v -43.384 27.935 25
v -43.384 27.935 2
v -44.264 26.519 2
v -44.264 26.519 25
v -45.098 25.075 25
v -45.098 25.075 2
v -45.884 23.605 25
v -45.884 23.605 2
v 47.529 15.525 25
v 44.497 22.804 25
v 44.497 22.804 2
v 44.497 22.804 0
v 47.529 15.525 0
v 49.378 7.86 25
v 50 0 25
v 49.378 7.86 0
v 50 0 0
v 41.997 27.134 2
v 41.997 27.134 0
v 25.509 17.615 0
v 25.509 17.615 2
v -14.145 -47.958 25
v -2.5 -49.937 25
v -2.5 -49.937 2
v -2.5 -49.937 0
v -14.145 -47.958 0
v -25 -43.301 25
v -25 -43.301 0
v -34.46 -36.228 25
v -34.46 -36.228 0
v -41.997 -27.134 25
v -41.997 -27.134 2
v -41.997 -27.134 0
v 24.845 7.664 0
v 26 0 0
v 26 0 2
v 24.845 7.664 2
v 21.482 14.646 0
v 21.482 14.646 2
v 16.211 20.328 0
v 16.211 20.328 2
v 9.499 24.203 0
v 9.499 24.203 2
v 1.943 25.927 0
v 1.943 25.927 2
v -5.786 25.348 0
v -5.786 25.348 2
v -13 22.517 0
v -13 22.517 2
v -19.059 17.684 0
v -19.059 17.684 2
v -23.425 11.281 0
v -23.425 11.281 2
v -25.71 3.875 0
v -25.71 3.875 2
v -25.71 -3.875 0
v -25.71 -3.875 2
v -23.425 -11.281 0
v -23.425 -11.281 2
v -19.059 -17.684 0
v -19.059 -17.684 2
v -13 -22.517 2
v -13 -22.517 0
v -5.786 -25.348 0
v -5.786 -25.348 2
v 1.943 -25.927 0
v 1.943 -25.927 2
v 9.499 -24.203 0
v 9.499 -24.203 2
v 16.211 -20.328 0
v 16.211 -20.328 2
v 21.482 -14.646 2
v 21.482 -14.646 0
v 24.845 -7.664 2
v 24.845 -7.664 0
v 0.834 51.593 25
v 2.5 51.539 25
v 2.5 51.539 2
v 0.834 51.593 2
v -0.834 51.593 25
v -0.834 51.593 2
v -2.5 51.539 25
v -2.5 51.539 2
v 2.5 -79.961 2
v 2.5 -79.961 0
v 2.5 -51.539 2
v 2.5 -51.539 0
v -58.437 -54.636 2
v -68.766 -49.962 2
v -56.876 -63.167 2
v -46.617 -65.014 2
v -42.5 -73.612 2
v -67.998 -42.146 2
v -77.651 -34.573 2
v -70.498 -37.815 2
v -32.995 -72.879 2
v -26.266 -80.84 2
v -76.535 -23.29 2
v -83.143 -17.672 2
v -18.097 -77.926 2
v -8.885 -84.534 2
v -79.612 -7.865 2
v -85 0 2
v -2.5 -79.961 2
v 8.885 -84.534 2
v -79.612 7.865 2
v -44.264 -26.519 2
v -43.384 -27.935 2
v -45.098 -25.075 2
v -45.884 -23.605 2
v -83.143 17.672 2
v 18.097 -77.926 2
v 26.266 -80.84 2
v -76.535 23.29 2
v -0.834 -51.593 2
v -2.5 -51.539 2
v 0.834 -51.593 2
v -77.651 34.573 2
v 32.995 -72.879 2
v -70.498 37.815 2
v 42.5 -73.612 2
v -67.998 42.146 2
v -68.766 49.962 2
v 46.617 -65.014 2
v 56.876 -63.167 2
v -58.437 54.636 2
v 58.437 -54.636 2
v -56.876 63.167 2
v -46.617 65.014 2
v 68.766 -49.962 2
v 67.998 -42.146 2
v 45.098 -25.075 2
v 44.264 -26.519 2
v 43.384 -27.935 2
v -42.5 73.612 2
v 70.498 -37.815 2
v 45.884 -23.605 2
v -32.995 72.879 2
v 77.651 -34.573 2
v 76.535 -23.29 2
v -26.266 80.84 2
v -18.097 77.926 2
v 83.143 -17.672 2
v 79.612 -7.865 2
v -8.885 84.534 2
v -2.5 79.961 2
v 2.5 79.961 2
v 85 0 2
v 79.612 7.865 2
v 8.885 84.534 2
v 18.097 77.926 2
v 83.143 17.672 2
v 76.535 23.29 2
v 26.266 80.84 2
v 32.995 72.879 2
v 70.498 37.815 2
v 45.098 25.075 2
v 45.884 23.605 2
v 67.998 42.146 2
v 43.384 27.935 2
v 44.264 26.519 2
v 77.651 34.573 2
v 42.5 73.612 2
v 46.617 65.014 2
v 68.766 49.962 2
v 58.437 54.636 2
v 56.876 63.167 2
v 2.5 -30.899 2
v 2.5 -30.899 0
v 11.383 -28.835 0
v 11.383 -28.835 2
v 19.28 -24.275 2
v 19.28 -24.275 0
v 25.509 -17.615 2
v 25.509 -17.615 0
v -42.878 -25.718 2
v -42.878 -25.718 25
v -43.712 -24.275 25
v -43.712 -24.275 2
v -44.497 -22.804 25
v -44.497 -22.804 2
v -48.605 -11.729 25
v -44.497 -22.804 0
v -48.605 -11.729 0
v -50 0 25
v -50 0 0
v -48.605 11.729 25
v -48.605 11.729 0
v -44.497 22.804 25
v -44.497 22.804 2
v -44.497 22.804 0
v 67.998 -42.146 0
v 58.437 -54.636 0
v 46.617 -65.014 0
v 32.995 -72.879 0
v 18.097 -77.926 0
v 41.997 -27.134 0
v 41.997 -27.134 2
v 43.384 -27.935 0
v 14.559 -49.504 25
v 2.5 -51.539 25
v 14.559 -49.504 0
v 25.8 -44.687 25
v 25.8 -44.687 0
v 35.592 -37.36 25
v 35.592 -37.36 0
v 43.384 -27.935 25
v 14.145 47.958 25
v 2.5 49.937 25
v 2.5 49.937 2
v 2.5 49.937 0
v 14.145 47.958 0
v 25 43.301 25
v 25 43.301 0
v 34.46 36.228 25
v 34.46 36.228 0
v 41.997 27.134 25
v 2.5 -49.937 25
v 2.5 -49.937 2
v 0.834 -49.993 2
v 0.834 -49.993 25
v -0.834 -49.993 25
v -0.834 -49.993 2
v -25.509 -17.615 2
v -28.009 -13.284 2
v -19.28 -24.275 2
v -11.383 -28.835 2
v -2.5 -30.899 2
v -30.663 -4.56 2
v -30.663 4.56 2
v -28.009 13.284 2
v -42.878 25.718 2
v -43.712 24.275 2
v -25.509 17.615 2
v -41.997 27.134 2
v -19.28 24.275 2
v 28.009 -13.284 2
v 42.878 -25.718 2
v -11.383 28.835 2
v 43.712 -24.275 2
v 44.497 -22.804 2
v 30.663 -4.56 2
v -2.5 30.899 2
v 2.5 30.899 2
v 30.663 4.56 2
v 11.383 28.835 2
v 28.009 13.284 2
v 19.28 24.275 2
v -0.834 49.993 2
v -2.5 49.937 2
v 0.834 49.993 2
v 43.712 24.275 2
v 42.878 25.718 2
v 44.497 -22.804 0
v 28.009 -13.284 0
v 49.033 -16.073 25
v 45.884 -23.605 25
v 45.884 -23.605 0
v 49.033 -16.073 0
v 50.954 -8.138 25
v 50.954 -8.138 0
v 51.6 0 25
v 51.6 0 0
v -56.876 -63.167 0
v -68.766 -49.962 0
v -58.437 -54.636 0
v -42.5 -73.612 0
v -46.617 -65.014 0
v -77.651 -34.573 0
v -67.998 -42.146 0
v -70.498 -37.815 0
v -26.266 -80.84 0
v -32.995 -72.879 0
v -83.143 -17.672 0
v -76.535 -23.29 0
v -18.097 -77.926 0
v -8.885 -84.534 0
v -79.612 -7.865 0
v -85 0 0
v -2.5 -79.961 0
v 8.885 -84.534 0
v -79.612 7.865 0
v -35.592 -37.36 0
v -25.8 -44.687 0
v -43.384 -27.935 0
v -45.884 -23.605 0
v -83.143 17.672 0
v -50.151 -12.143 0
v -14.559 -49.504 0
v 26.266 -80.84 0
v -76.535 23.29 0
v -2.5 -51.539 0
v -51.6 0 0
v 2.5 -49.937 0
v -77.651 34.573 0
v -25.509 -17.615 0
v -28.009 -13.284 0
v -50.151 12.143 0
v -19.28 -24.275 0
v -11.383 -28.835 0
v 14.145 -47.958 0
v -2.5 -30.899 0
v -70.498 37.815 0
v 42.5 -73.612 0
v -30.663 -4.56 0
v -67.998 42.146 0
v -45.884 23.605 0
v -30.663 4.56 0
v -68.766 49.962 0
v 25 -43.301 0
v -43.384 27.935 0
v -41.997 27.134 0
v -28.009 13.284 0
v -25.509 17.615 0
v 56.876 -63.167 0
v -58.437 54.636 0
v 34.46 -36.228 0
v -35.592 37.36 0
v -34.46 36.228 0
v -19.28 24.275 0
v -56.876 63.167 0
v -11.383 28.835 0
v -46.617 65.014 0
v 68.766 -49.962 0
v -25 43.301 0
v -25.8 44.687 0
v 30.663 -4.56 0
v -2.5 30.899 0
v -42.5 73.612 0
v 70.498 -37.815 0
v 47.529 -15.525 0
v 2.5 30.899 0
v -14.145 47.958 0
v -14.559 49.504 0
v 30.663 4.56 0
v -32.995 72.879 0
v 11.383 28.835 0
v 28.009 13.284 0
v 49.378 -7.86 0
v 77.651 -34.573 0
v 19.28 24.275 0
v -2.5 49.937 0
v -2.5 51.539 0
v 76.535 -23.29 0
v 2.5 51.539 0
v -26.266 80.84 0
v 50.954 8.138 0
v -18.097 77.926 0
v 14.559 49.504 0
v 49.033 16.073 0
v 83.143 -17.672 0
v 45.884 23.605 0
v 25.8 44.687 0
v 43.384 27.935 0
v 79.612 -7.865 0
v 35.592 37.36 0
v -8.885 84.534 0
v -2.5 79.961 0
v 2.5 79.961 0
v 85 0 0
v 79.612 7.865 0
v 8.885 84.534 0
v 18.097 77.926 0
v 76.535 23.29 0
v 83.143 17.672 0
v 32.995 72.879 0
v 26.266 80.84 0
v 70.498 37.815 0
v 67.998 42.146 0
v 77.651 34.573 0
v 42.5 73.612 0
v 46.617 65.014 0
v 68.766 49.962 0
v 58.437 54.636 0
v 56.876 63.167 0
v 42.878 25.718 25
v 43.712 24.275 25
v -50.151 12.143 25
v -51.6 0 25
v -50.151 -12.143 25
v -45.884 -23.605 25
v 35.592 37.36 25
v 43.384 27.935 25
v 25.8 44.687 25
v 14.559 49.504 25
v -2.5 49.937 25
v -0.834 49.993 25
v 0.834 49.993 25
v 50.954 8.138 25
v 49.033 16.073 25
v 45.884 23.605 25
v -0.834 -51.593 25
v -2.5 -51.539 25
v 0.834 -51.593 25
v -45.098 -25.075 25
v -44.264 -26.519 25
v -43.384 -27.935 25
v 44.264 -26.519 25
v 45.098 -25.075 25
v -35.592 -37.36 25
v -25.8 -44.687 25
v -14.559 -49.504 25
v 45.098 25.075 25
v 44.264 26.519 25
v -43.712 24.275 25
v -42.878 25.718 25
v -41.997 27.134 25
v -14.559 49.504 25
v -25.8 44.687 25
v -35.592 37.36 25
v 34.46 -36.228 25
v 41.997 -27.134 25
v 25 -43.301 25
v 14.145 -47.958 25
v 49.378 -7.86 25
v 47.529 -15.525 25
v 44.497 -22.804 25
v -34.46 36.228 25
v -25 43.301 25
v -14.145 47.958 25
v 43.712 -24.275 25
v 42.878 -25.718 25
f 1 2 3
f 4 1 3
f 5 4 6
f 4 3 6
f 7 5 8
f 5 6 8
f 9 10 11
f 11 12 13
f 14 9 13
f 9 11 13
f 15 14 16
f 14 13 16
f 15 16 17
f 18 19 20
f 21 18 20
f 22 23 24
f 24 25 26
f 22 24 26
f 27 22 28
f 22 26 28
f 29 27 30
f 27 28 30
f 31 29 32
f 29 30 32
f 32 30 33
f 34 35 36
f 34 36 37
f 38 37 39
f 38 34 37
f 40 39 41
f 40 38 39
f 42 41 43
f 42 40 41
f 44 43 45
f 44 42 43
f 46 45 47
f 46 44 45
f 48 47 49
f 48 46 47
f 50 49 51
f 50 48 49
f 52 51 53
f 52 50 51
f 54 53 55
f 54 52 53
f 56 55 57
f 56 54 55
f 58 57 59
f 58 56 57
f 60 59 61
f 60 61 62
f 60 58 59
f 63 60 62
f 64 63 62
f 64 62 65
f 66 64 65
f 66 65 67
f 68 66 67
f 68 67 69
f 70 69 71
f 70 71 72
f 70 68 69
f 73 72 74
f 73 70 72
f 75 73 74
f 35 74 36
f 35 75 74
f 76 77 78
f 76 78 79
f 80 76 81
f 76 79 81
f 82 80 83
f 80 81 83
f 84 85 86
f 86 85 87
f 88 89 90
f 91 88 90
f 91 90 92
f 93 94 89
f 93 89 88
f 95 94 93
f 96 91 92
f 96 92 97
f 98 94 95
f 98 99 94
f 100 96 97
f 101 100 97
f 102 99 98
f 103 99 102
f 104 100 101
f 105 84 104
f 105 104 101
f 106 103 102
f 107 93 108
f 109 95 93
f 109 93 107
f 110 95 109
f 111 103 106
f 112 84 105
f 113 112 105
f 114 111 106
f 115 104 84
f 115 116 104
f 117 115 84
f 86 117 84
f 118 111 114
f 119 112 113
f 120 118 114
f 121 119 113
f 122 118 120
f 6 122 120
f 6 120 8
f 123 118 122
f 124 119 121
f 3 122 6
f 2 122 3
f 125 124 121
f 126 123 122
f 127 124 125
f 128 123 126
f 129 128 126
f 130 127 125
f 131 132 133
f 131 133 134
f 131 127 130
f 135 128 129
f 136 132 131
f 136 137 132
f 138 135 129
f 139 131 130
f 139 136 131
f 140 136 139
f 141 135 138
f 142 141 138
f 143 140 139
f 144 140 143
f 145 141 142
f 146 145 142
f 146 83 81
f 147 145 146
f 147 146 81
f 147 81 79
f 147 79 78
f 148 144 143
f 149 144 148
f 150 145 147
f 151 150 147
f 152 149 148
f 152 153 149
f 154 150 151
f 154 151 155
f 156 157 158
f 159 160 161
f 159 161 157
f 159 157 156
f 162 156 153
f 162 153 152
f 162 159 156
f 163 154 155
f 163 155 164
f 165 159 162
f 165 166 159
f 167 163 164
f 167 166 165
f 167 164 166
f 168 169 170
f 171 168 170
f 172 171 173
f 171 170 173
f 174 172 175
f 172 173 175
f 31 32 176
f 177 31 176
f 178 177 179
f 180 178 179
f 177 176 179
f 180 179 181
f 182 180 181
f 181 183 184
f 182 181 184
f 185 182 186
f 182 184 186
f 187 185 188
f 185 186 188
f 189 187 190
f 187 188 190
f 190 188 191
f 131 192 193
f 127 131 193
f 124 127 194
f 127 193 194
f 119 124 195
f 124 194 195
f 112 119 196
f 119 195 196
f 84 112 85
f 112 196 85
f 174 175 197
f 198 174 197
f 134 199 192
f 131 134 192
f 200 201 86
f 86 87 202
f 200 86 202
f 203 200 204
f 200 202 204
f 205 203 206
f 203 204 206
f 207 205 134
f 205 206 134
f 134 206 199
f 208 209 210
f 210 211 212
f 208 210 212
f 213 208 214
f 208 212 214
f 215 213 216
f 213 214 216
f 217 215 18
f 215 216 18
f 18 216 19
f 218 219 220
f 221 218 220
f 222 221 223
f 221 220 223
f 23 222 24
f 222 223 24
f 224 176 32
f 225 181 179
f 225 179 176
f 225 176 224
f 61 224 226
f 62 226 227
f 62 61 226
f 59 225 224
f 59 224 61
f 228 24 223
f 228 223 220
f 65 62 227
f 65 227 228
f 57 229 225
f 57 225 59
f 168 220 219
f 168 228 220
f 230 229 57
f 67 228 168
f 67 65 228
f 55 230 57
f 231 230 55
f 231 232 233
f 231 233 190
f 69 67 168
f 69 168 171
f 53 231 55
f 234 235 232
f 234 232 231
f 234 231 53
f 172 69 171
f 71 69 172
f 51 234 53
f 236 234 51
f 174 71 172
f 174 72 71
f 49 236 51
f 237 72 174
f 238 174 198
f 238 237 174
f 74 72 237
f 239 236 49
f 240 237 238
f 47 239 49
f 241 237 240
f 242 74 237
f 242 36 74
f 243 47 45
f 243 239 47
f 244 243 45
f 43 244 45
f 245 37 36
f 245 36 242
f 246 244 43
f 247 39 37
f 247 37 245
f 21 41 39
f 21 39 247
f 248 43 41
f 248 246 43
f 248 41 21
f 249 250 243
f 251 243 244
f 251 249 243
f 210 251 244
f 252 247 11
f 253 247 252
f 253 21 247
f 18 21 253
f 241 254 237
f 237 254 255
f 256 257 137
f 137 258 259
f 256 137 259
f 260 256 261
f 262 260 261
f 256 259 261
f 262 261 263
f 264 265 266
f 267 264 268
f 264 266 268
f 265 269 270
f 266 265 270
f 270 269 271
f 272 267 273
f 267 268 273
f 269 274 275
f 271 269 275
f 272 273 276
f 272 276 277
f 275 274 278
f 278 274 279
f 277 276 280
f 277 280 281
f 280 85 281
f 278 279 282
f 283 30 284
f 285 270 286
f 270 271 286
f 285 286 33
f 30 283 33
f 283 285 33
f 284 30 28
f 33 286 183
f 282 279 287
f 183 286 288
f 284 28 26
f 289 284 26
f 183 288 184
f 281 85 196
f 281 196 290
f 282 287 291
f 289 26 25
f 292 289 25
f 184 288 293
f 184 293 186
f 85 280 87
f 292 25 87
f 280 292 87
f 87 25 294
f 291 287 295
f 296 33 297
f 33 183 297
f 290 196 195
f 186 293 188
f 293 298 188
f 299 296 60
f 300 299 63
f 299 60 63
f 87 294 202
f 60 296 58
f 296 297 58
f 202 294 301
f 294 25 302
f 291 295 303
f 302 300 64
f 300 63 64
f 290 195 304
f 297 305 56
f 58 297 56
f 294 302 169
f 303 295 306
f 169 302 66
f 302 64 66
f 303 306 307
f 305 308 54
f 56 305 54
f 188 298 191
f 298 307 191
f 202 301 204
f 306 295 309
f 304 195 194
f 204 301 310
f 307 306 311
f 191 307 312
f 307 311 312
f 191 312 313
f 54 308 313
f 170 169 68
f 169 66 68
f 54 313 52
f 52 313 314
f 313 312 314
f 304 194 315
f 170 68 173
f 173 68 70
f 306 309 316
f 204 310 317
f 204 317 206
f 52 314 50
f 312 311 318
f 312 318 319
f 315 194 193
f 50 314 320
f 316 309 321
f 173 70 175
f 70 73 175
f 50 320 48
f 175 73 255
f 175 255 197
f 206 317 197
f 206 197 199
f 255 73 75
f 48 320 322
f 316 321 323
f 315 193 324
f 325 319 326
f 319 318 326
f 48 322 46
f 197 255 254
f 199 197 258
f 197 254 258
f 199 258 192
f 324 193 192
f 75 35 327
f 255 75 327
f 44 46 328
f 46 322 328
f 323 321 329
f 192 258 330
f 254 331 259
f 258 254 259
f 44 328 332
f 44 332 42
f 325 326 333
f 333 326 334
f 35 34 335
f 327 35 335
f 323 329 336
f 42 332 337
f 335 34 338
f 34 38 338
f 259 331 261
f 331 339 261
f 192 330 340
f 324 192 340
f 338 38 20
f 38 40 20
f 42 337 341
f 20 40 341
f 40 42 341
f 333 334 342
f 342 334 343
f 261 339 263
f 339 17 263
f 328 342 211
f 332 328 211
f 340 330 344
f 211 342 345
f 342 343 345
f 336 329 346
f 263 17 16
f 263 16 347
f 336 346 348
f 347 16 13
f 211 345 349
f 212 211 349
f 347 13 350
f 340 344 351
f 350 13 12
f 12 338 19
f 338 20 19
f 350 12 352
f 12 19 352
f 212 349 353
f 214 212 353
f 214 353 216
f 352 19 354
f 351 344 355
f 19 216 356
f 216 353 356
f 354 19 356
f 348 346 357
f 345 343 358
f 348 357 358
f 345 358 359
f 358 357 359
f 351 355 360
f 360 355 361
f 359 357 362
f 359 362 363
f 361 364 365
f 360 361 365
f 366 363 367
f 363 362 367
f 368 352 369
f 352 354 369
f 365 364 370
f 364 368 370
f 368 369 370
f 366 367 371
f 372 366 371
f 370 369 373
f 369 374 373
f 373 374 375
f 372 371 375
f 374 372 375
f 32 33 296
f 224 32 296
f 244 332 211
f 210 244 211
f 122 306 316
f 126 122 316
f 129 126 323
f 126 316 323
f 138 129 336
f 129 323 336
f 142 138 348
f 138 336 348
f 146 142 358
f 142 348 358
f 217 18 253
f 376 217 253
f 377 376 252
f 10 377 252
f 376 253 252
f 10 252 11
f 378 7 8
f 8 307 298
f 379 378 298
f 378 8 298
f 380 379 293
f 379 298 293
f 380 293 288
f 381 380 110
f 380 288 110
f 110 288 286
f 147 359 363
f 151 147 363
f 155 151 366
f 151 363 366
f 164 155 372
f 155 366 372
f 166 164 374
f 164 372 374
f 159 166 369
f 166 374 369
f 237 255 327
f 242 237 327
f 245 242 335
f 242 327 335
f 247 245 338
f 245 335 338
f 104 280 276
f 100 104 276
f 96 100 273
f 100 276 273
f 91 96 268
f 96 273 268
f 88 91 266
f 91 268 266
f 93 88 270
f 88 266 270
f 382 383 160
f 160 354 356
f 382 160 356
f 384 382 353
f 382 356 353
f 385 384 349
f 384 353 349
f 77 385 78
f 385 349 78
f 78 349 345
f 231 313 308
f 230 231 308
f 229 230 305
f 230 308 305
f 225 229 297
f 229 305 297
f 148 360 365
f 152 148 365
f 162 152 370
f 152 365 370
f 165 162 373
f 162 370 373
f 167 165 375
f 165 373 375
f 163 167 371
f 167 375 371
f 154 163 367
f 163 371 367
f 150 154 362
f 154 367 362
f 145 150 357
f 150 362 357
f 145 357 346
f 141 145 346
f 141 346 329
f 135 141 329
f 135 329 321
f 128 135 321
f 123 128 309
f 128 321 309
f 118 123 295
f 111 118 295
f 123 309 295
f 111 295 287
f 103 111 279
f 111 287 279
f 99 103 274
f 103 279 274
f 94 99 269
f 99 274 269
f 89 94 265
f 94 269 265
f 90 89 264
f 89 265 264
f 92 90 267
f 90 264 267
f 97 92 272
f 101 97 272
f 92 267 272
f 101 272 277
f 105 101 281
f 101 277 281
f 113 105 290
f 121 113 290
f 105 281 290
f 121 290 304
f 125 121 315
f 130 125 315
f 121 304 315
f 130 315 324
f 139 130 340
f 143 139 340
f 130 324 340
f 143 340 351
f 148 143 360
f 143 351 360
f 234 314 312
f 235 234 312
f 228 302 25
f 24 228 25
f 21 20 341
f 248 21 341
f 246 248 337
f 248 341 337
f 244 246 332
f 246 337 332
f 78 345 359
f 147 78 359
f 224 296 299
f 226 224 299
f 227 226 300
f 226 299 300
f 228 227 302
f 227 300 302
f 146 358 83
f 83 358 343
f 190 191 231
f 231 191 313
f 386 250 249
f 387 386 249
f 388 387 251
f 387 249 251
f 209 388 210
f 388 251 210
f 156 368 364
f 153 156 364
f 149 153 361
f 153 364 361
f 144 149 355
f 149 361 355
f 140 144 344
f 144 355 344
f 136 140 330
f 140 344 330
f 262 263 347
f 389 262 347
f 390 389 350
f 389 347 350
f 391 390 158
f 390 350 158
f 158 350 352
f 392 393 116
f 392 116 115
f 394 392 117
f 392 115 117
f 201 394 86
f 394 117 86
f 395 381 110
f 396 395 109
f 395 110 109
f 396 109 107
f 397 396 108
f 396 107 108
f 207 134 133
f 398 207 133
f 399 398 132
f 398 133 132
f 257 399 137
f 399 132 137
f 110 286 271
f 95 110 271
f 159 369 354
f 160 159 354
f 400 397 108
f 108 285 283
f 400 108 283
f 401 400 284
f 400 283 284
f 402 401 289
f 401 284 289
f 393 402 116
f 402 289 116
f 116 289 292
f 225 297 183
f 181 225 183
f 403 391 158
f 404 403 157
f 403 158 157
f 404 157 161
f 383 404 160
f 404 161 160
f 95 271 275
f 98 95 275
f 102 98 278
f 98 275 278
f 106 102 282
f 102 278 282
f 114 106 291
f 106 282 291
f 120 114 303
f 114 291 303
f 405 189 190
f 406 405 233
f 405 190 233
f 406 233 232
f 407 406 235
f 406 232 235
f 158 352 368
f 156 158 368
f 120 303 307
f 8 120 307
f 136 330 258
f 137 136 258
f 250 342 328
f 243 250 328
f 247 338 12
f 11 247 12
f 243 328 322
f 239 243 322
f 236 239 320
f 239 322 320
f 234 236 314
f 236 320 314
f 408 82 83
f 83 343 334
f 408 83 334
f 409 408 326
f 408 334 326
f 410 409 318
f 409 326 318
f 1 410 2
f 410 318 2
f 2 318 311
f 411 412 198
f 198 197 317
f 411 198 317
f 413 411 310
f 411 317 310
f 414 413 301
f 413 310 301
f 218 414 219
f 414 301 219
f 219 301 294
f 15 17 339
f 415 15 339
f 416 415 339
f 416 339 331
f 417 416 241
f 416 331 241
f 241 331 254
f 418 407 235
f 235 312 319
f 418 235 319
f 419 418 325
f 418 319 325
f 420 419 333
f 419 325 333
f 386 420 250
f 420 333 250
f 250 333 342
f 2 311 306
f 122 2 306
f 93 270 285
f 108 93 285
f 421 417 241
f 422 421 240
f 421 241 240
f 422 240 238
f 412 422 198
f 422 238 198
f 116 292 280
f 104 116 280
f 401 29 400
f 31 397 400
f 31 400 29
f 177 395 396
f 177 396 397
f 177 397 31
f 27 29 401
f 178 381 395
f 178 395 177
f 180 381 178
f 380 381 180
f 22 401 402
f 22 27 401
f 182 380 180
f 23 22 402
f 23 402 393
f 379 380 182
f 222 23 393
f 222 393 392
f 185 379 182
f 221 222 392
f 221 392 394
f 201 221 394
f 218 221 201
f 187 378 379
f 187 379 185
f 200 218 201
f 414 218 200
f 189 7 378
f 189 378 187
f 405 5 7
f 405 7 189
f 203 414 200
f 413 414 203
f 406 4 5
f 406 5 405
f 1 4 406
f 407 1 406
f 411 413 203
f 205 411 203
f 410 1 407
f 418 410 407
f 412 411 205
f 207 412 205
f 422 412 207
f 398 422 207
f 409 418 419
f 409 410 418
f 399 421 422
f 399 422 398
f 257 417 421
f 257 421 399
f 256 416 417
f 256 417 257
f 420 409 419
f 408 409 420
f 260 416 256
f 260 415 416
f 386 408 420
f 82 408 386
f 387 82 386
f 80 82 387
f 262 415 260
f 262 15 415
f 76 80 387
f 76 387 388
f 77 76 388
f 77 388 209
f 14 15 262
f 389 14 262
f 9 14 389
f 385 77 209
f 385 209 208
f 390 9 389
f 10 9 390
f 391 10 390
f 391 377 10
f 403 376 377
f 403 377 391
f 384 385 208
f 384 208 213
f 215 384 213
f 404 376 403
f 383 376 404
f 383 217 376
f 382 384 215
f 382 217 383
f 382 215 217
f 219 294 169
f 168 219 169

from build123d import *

# Parameters (mm, degrees)
F0_R     = 85
F0_R_2   = 26
F1_DEPTH = 2
F2_DEPTH = 25


with BuildPart() as f1:
    # F0 (on Top) → F1 (new body)
    with BuildSketch(Plane.XY):
        Circle(F0_R)
        with BuildLine():
            ThreePointArc((43.384432, 27.934765), (44.686911, 25.8), (45.884432, 23.604638))
            Line((45.884432, 23.604638), (70.498195, 37.8154))
            ThreePointArc((70.498195, 37.8154), (80, 0), (70.498195, -37.8154))
            Line((70.498195, -37.8154), (45.884432, -23.604638))
            ThreePointArc((45.884432, -23.604638), (44.686911, -25.8), (43.384432, -27.934765))
            Line((43.384432, -27.934765), (67.998195, -42.145527))
            ThreePointArc((67.998195, -42.145527), (40, -69.282032), (2.5, -79.960928))
            Line((2.5, -79.960928), (2.5, -51.539402))
            ThreePointArc((2.5, -51.539402), (0, -51.6), (-2.5, -51.539402))
            Line((-2.5, -51.539402), (-2.5, -79.960928))
            ThreePointArc((-2.5, -79.960928), (-40, -69.282032), (-67.998195, -42.145527))
            Line((-67.998195, -42.145527), (-43.384432, -27.934765))
            ThreePointArc((-43.384432, -27.934765), (-44.686911, -25.8), (-45.884432, -23.604638))
            Line((-45.884432, -23.604638), (-70.498195, -37.8154))
            ThreePointArc((-70.498195, -37.8154), (-80, 0), (-70.498195, 37.8154))
            Line((-70.498195, 37.8154), (-45.884432, 23.604638))
            ThreePointArc((-45.884432, 23.604638), (-44.686911, 25.8), (-43.384432, 27.934765))
            Line((-43.384432, 27.934765), (-67.998195, 42.145527))
            ThreePointArc((-67.998195, 42.145527), (-40, 69.282032), (-2.5, 79.960928))
            Line((-2.5, 79.960928), (-2.5, 51.539402))
            ThreePointArc((-2.5, 51.539402), (0, 51.6), (2.5, 51.539402))
            Line((2.5, 51.539402), (2.5, 79.960928))
            ThreePointArc((2.5, 79.960928), (40, 69.282032), (67.998195, 42.145527))
            Line((67.998195, 42.145527), (43.384432, 27.934765))
        make_face(mode=Mode.SUBTRACT)
        with BuildLine():
            Line((28.009344, 13.284451), (44.49711, 22.803667))
            ThreePointArc((44.49711, 22.803667), (43.30127, 25), (41.99711, 27.133794))
            Line((41.99711, 27.133794), (25.509344, 17.614578))
            ThreePointArc((25.509344, 17.614578), (15.5, 26.846788), (2.5, 30.899029))
            Line((2.5, 30.899029), (2.5, 49.937461))
            ThreePointArc((2.5, 49.937461), (0, 50), (-2.5, 49.937461))
            Line((-2.5, 49.937461), (-2.5, 30.899029))
            ThreePointArc((-2.5, 30.899029), (-15.5, 26.846788), (-25.509344, 17.614578))
            Line((-25.509344, 17.614578), (-41.99711, 27.133794))
            ThreePointArc((-41.99711, 27.133794), (-43.30127, 25), (-44.49711, 22.803667))
            Line((-44.49711, 22.803667), (-28.009344, 13.284451))
            ThreePointArc((-28.009344, 13.284451), (-31, 0), (-28.009344, -13.284451))
            Line((-28.009344, -13.284451), (-44.49711, -22.803667))
            ThreePointArc((-44.49711, -22.803667), (-43.30127, -25), (-41.99711, -27.133794))
            Line((-41.99711, -27.133794), (-25.509344, -17.614578))
            ThreePointArc((-25.509344, -17.614578), (-15.5, -26.846788), (-2.5, -30.899029))
            Line((-2.5, -30.899029), (-2.5, -49.937461))
            ThreePointArc((-2.5, -49.937461), (0, -50), (2.5, -49.937461))
            Line((2.5, -49.937461), (2.5, -30.899029))
            ThreePointArc((2.5, -30.899029), (15.5, -26.846788), (25.509344, -17.614578))
            Line((25.509344, -17.614578), (41.99711, -27.133794))
            ThreePointArc((41.99711, -27.133794), (43.30127, -25), (44.49711, -22.803667))
            Line((44.49711, -22.803667), (28.009344, -13.284451))
            ThreePointArc((28.009344, -13.284451), (31, 0), (28.009344, 13.284451))
        make_face()
        Circle(F0_R_2, mode=Mode.SUBTRACT)
    extrude(amount=F1_DEPTH)

    # F0 (on Top) → F2 (join)
    with BuildSketch(Plane.XY):
        with BuildLine():
            ThreePointArc((45.884432, -23.604638), (50.150756, -12.143379), (51.6, 0))
            ThreePointArc((51.6, 0), (50.150756, 12.143379), (45.884432, 23.604638))
            ThreePointArc((45.884432, 23.604638), (44.686911, 25.8), (43.384432, 27.934765))
            ThreePointArc((43.384432, 27.934765), (25.8, 44.686911), (2.5, 51.539402))
            ThreePointArc((2.5, 51.539402), (0, 51.6), (-2.5, 51.539402))
            ThreePointArc((-2.5, 51.539402), (-25.8, 44.686911), (-43.384432, 27.934765))
            ThreePointArc((-43.384432, 27.934765), (-44.686911, 25.8), (-45.884432, 23.604638))
            ThreePointArc((-45.884432, 23.604638), (-51.6, 0), (-45.884432, -23.604638))
            ThreePointArc((-45.884432, -23.604638), (-44.686911, -25.8), (-43.384432, -27.934765))
            ThreePointArc((-43.384432, -27.934765), (-25.8, -44.686911), (-2.5, -51.539402))
            ThreePointArc((-2.5, -51.539402), (0, -51.6), (2.5, -51.539402))
            ThreePointArc((2.5, -51.539402), (25.8, -44.686911), (43.384432, -27.934765))
            ThreePointArc((43.384432, -27.934765), (44.686911, -25.8), (45.884432, -23.604638))
        make_face()
        with BuildLine():
            ThreePointArc((44.49711, 22.803667), (48.604812, 11.72912), (50, 0))
            ThreePointArc((50, 0), (48.604812, -11.72912), (44.49711, -22.803667))
            ThreePointArc((44.49711, -22.803667), (43.30127, -25), (41.99711, -27.133794))
            ThreePointArc((41.99711, -27.133794), (25, -43.30127), (2.5, -49.937461))
            ThreePointArc((2.5, -49.937461), (0, -50), (-2.5, -49.937461))
            ThreePointArc((-2.5, -49.937461), (-25, -43.30127), (-41.99711, -27.133794))
            ThreePointArc((-41.99711, -27.133794), (-43.30127, -25), (-44.49711, -22.803667))
            ThreePointArc((-44.49711, -22.803667), (-50, 0), (-44.49711, 22.803667))
            ThreePointArc((-44.49711, 22.803667), (-43.30127, 25), (-41.99711, 27.133794))
            ThreePointArc((-41.99711, 27.133794), (-25, 43.30127), (-2.5, 49.937461))
            ThreePointArc((-2.5, 49.937461), (0, 50), (2.5, 49.937461))
            ThreePointArc((2.5, 49.937461), (25, 43.30127), (41.99711, 27.133794))
            ThreePointArc((41.99711, 27.133794), (43.30127, 25), (44.49711, 22.803667))
        make_face(mode=Mode.SUBTRACT)
    extrude(amount=F2_DEPTH)


solid = f1.part
